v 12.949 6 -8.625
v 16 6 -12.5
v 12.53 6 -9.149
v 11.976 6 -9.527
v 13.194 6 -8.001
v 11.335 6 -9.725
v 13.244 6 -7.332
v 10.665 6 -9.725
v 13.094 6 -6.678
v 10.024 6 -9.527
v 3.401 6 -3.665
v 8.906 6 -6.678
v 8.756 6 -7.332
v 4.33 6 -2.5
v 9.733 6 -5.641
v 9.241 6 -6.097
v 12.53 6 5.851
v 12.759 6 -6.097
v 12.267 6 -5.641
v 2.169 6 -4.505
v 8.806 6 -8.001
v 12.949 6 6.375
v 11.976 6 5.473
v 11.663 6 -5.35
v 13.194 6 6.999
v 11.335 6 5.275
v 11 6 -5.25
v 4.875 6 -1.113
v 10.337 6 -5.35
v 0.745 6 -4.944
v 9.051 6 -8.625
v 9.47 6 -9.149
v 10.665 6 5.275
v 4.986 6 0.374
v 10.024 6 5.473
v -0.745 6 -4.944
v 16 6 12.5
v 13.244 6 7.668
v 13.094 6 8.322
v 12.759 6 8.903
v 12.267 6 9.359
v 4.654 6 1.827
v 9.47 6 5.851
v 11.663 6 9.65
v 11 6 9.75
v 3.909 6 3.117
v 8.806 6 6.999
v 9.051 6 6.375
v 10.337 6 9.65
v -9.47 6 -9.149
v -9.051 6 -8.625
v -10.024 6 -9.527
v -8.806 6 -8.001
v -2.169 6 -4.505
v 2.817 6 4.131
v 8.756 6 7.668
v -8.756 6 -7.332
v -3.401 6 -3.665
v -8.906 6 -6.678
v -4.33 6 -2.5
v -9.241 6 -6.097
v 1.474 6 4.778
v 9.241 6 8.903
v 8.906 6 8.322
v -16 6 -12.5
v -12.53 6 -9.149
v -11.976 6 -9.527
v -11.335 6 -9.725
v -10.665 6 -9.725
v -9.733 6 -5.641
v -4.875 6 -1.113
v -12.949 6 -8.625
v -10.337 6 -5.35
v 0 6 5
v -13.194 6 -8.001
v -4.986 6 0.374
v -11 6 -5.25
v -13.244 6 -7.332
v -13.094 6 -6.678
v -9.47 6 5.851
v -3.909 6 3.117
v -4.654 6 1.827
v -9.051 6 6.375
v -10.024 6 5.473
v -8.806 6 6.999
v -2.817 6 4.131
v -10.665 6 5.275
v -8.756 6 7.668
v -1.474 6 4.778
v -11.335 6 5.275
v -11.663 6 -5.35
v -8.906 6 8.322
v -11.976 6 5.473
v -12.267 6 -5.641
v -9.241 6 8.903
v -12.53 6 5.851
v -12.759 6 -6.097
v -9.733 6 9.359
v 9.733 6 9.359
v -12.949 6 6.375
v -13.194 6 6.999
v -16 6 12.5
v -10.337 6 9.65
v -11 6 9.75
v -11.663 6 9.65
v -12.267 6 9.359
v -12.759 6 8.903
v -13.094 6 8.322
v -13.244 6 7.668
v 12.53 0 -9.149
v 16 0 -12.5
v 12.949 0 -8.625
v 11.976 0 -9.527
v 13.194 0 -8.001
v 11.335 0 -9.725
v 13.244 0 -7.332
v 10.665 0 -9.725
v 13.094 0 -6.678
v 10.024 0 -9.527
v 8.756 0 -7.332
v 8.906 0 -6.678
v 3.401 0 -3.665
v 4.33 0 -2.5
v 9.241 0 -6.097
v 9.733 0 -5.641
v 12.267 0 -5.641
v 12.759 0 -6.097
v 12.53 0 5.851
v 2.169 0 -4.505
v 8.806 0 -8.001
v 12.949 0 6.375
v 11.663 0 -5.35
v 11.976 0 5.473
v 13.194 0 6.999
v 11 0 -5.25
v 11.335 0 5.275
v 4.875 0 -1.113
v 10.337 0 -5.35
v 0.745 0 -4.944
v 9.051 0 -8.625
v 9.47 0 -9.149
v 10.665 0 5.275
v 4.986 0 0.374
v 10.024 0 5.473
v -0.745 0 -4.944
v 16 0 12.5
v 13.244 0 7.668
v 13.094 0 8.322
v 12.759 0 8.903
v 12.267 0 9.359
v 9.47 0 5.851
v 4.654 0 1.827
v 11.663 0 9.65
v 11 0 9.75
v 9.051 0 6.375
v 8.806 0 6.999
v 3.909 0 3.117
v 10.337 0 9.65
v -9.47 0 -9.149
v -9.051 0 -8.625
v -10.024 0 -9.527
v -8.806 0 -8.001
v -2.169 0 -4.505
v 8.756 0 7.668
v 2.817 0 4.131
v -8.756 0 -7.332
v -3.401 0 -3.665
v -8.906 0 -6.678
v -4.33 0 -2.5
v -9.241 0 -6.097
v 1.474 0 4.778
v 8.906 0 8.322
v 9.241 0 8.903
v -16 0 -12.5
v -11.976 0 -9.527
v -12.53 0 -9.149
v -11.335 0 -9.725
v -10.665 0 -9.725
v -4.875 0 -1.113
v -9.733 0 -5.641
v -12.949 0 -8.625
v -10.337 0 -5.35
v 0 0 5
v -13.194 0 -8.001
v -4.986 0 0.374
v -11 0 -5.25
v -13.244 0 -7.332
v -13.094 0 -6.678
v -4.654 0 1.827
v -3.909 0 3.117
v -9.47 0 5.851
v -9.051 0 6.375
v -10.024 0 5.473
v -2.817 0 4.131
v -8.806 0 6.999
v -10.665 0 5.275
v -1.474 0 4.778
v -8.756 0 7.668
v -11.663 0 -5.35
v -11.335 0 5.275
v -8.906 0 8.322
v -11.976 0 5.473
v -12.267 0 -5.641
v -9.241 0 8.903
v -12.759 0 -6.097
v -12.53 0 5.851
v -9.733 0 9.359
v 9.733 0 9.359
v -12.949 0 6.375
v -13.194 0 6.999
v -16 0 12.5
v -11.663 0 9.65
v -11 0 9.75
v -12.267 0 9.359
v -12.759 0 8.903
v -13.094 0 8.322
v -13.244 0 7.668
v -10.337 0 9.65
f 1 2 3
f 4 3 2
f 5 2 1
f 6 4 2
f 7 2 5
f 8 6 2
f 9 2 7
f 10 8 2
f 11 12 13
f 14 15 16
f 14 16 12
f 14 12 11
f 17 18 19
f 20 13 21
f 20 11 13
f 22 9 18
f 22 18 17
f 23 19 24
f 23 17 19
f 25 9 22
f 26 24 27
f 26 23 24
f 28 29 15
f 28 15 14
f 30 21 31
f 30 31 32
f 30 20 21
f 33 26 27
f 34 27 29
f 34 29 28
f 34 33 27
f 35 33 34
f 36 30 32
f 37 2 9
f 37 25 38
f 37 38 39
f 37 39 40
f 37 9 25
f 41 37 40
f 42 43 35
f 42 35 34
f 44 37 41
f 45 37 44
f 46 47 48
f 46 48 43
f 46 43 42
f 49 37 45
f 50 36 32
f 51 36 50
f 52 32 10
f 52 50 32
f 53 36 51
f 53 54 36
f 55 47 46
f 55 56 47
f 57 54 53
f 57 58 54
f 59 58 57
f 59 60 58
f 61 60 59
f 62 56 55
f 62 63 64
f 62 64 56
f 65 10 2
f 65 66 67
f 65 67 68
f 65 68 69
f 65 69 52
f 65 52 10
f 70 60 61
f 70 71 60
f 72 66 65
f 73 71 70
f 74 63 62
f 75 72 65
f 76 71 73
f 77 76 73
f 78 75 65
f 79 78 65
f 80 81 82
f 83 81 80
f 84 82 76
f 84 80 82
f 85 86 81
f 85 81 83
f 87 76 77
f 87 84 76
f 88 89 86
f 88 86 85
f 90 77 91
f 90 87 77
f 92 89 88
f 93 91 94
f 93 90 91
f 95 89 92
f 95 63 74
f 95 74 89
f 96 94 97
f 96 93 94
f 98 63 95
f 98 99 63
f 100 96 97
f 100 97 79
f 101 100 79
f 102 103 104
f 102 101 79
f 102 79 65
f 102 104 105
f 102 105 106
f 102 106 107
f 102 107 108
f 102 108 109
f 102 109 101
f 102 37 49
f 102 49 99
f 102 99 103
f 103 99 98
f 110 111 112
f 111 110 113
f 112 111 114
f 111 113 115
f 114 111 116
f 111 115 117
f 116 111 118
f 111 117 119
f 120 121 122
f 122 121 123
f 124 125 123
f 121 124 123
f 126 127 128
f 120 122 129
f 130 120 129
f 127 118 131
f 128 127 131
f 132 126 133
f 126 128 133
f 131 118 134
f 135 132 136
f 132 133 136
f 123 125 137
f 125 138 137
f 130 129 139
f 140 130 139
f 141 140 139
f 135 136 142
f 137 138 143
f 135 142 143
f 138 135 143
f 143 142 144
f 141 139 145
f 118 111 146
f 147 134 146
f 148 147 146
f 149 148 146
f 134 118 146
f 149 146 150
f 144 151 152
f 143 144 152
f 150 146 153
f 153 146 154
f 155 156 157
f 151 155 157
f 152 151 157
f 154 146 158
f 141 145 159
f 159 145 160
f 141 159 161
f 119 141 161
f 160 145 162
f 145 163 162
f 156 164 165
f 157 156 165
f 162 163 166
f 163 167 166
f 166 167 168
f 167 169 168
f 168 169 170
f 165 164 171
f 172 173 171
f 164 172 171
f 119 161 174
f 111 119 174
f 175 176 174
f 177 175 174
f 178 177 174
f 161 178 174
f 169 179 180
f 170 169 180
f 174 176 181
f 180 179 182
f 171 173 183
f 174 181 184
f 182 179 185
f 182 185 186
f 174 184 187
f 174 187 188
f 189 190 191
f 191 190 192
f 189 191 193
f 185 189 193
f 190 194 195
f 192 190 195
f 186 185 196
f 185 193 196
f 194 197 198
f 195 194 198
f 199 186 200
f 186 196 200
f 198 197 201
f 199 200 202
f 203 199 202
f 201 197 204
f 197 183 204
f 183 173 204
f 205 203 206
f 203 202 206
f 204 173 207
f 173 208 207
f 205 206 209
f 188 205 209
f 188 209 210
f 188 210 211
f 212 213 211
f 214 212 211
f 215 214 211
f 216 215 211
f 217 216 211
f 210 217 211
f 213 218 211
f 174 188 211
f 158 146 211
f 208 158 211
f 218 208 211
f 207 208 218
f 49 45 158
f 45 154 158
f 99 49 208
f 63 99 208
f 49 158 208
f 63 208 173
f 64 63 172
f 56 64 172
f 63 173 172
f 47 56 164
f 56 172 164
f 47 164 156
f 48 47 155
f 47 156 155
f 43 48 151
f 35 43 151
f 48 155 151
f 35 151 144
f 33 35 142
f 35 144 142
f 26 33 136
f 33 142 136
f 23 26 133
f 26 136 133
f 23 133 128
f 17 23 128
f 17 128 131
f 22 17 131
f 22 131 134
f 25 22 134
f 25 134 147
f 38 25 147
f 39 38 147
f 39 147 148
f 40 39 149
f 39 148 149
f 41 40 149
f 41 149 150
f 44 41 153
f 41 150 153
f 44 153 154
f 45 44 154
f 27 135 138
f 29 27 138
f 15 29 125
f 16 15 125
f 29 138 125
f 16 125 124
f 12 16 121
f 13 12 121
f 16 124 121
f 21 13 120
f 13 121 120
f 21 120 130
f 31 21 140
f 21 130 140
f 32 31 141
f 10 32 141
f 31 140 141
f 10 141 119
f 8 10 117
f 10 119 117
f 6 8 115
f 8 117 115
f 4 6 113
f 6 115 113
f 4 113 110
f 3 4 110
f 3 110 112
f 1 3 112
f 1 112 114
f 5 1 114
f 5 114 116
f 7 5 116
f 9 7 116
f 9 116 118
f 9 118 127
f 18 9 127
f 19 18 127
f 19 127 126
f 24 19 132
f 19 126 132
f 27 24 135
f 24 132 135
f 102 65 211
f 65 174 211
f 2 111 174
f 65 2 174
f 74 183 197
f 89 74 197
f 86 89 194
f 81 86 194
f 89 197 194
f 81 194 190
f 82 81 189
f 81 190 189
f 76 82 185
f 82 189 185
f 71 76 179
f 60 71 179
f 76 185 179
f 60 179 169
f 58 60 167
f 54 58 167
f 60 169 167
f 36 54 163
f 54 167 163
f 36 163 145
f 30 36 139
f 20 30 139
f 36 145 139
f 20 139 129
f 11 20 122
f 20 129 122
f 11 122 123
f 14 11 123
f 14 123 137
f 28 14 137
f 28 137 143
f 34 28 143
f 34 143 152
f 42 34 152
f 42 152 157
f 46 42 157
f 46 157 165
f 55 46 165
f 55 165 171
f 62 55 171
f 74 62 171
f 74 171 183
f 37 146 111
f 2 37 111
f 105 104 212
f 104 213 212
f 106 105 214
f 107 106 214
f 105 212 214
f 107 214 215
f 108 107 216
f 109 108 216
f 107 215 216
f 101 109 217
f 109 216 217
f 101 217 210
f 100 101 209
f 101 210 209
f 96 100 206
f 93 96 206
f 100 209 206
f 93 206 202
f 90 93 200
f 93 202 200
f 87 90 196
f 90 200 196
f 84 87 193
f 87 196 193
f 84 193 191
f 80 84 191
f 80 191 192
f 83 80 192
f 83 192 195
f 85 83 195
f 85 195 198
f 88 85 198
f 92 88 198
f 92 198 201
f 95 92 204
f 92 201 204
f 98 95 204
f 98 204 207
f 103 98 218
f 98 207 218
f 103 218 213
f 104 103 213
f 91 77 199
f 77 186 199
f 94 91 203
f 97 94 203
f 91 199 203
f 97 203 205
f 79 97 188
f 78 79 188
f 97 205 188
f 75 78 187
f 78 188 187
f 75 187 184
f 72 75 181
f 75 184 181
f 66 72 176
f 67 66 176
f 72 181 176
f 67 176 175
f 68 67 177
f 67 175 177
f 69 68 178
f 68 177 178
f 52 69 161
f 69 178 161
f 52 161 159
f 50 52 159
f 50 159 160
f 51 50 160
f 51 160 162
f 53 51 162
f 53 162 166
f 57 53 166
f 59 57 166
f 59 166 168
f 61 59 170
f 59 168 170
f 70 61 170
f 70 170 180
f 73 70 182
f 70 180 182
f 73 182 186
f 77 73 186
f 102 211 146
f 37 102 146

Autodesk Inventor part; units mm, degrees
ref_plane "YZ Plane" through (0, 0, 0) normal (1, 0, 0) x (0, 1, 0)
ref_plane "XZ Plane" through (0, 0, 0) normal (0, 1, 0) x (-1, 0, 0)
ref_plane "XY Plane" through (0, 0, 0) normal (0, 0, 1) x (1, 0, 0)
sketch "Sketch1" plane through (0, 0, 0) normal (0, 1, 0) x (-1, 0, 0)
  line L0 (-16, 12.5) -> (-16, -12.5)
  line L1 (16, 12.5) -> (-16, 12.5)
  line L2 (16, -12.5) -> (16, 12.5)
  line L3 (-16, -12.5) -> (16, -12.5)
extrude "Extrusion1" add sketch "Sketch1" along normal blind 6
hole "Hole5" at (0, 6, 0) direction (0, -1, 0) diameter 10 depth 6
hole "Hole4" at (-11, 6, -7.5) direction (0, -1, 0) diameter 4.5 depth 6
sketch "Sketch4" plane through (0, 6, 0) normal (0, 1, 0) x (1, 0, 0)
  point P0 (11, -7.5)
hole "Hole3" at (11, 6, 7.5) direction (0, -1, 0) diameter 4.5 depth 6
sketch "Sketch3" plane through (0, 6, 0) normal (0, 1, 0) x (1, 0, 0)
  point P0 (-11, 7.5)
hole "Hole2" at (11, 6, -7.5) direction (0, -1, 0) diameter 4.5 depth 6
sketch "Sketch2" plane through (0, 6, 0) normal (0, 1, 0) x (1, 0, 0)
  point P0 (0, 0)
hole "Hole1" at (-11, 6, 7.5) direction (0, -1, 0) diameter 4.5 depth 6
sketch "Sketch5" plane through (0, 6, 0) normal (0, 1, 0) x (1, 0, 0)
  point P0 (11, 7.5)
sketch "Sketch6" plane through (0, 6, 0) normal (0, 1, 0) x (1, 0, 0)
  point P0 (-11, -7.5)
properties part number "Hopper Nut Trap Holder" material "ASA Plastic"
